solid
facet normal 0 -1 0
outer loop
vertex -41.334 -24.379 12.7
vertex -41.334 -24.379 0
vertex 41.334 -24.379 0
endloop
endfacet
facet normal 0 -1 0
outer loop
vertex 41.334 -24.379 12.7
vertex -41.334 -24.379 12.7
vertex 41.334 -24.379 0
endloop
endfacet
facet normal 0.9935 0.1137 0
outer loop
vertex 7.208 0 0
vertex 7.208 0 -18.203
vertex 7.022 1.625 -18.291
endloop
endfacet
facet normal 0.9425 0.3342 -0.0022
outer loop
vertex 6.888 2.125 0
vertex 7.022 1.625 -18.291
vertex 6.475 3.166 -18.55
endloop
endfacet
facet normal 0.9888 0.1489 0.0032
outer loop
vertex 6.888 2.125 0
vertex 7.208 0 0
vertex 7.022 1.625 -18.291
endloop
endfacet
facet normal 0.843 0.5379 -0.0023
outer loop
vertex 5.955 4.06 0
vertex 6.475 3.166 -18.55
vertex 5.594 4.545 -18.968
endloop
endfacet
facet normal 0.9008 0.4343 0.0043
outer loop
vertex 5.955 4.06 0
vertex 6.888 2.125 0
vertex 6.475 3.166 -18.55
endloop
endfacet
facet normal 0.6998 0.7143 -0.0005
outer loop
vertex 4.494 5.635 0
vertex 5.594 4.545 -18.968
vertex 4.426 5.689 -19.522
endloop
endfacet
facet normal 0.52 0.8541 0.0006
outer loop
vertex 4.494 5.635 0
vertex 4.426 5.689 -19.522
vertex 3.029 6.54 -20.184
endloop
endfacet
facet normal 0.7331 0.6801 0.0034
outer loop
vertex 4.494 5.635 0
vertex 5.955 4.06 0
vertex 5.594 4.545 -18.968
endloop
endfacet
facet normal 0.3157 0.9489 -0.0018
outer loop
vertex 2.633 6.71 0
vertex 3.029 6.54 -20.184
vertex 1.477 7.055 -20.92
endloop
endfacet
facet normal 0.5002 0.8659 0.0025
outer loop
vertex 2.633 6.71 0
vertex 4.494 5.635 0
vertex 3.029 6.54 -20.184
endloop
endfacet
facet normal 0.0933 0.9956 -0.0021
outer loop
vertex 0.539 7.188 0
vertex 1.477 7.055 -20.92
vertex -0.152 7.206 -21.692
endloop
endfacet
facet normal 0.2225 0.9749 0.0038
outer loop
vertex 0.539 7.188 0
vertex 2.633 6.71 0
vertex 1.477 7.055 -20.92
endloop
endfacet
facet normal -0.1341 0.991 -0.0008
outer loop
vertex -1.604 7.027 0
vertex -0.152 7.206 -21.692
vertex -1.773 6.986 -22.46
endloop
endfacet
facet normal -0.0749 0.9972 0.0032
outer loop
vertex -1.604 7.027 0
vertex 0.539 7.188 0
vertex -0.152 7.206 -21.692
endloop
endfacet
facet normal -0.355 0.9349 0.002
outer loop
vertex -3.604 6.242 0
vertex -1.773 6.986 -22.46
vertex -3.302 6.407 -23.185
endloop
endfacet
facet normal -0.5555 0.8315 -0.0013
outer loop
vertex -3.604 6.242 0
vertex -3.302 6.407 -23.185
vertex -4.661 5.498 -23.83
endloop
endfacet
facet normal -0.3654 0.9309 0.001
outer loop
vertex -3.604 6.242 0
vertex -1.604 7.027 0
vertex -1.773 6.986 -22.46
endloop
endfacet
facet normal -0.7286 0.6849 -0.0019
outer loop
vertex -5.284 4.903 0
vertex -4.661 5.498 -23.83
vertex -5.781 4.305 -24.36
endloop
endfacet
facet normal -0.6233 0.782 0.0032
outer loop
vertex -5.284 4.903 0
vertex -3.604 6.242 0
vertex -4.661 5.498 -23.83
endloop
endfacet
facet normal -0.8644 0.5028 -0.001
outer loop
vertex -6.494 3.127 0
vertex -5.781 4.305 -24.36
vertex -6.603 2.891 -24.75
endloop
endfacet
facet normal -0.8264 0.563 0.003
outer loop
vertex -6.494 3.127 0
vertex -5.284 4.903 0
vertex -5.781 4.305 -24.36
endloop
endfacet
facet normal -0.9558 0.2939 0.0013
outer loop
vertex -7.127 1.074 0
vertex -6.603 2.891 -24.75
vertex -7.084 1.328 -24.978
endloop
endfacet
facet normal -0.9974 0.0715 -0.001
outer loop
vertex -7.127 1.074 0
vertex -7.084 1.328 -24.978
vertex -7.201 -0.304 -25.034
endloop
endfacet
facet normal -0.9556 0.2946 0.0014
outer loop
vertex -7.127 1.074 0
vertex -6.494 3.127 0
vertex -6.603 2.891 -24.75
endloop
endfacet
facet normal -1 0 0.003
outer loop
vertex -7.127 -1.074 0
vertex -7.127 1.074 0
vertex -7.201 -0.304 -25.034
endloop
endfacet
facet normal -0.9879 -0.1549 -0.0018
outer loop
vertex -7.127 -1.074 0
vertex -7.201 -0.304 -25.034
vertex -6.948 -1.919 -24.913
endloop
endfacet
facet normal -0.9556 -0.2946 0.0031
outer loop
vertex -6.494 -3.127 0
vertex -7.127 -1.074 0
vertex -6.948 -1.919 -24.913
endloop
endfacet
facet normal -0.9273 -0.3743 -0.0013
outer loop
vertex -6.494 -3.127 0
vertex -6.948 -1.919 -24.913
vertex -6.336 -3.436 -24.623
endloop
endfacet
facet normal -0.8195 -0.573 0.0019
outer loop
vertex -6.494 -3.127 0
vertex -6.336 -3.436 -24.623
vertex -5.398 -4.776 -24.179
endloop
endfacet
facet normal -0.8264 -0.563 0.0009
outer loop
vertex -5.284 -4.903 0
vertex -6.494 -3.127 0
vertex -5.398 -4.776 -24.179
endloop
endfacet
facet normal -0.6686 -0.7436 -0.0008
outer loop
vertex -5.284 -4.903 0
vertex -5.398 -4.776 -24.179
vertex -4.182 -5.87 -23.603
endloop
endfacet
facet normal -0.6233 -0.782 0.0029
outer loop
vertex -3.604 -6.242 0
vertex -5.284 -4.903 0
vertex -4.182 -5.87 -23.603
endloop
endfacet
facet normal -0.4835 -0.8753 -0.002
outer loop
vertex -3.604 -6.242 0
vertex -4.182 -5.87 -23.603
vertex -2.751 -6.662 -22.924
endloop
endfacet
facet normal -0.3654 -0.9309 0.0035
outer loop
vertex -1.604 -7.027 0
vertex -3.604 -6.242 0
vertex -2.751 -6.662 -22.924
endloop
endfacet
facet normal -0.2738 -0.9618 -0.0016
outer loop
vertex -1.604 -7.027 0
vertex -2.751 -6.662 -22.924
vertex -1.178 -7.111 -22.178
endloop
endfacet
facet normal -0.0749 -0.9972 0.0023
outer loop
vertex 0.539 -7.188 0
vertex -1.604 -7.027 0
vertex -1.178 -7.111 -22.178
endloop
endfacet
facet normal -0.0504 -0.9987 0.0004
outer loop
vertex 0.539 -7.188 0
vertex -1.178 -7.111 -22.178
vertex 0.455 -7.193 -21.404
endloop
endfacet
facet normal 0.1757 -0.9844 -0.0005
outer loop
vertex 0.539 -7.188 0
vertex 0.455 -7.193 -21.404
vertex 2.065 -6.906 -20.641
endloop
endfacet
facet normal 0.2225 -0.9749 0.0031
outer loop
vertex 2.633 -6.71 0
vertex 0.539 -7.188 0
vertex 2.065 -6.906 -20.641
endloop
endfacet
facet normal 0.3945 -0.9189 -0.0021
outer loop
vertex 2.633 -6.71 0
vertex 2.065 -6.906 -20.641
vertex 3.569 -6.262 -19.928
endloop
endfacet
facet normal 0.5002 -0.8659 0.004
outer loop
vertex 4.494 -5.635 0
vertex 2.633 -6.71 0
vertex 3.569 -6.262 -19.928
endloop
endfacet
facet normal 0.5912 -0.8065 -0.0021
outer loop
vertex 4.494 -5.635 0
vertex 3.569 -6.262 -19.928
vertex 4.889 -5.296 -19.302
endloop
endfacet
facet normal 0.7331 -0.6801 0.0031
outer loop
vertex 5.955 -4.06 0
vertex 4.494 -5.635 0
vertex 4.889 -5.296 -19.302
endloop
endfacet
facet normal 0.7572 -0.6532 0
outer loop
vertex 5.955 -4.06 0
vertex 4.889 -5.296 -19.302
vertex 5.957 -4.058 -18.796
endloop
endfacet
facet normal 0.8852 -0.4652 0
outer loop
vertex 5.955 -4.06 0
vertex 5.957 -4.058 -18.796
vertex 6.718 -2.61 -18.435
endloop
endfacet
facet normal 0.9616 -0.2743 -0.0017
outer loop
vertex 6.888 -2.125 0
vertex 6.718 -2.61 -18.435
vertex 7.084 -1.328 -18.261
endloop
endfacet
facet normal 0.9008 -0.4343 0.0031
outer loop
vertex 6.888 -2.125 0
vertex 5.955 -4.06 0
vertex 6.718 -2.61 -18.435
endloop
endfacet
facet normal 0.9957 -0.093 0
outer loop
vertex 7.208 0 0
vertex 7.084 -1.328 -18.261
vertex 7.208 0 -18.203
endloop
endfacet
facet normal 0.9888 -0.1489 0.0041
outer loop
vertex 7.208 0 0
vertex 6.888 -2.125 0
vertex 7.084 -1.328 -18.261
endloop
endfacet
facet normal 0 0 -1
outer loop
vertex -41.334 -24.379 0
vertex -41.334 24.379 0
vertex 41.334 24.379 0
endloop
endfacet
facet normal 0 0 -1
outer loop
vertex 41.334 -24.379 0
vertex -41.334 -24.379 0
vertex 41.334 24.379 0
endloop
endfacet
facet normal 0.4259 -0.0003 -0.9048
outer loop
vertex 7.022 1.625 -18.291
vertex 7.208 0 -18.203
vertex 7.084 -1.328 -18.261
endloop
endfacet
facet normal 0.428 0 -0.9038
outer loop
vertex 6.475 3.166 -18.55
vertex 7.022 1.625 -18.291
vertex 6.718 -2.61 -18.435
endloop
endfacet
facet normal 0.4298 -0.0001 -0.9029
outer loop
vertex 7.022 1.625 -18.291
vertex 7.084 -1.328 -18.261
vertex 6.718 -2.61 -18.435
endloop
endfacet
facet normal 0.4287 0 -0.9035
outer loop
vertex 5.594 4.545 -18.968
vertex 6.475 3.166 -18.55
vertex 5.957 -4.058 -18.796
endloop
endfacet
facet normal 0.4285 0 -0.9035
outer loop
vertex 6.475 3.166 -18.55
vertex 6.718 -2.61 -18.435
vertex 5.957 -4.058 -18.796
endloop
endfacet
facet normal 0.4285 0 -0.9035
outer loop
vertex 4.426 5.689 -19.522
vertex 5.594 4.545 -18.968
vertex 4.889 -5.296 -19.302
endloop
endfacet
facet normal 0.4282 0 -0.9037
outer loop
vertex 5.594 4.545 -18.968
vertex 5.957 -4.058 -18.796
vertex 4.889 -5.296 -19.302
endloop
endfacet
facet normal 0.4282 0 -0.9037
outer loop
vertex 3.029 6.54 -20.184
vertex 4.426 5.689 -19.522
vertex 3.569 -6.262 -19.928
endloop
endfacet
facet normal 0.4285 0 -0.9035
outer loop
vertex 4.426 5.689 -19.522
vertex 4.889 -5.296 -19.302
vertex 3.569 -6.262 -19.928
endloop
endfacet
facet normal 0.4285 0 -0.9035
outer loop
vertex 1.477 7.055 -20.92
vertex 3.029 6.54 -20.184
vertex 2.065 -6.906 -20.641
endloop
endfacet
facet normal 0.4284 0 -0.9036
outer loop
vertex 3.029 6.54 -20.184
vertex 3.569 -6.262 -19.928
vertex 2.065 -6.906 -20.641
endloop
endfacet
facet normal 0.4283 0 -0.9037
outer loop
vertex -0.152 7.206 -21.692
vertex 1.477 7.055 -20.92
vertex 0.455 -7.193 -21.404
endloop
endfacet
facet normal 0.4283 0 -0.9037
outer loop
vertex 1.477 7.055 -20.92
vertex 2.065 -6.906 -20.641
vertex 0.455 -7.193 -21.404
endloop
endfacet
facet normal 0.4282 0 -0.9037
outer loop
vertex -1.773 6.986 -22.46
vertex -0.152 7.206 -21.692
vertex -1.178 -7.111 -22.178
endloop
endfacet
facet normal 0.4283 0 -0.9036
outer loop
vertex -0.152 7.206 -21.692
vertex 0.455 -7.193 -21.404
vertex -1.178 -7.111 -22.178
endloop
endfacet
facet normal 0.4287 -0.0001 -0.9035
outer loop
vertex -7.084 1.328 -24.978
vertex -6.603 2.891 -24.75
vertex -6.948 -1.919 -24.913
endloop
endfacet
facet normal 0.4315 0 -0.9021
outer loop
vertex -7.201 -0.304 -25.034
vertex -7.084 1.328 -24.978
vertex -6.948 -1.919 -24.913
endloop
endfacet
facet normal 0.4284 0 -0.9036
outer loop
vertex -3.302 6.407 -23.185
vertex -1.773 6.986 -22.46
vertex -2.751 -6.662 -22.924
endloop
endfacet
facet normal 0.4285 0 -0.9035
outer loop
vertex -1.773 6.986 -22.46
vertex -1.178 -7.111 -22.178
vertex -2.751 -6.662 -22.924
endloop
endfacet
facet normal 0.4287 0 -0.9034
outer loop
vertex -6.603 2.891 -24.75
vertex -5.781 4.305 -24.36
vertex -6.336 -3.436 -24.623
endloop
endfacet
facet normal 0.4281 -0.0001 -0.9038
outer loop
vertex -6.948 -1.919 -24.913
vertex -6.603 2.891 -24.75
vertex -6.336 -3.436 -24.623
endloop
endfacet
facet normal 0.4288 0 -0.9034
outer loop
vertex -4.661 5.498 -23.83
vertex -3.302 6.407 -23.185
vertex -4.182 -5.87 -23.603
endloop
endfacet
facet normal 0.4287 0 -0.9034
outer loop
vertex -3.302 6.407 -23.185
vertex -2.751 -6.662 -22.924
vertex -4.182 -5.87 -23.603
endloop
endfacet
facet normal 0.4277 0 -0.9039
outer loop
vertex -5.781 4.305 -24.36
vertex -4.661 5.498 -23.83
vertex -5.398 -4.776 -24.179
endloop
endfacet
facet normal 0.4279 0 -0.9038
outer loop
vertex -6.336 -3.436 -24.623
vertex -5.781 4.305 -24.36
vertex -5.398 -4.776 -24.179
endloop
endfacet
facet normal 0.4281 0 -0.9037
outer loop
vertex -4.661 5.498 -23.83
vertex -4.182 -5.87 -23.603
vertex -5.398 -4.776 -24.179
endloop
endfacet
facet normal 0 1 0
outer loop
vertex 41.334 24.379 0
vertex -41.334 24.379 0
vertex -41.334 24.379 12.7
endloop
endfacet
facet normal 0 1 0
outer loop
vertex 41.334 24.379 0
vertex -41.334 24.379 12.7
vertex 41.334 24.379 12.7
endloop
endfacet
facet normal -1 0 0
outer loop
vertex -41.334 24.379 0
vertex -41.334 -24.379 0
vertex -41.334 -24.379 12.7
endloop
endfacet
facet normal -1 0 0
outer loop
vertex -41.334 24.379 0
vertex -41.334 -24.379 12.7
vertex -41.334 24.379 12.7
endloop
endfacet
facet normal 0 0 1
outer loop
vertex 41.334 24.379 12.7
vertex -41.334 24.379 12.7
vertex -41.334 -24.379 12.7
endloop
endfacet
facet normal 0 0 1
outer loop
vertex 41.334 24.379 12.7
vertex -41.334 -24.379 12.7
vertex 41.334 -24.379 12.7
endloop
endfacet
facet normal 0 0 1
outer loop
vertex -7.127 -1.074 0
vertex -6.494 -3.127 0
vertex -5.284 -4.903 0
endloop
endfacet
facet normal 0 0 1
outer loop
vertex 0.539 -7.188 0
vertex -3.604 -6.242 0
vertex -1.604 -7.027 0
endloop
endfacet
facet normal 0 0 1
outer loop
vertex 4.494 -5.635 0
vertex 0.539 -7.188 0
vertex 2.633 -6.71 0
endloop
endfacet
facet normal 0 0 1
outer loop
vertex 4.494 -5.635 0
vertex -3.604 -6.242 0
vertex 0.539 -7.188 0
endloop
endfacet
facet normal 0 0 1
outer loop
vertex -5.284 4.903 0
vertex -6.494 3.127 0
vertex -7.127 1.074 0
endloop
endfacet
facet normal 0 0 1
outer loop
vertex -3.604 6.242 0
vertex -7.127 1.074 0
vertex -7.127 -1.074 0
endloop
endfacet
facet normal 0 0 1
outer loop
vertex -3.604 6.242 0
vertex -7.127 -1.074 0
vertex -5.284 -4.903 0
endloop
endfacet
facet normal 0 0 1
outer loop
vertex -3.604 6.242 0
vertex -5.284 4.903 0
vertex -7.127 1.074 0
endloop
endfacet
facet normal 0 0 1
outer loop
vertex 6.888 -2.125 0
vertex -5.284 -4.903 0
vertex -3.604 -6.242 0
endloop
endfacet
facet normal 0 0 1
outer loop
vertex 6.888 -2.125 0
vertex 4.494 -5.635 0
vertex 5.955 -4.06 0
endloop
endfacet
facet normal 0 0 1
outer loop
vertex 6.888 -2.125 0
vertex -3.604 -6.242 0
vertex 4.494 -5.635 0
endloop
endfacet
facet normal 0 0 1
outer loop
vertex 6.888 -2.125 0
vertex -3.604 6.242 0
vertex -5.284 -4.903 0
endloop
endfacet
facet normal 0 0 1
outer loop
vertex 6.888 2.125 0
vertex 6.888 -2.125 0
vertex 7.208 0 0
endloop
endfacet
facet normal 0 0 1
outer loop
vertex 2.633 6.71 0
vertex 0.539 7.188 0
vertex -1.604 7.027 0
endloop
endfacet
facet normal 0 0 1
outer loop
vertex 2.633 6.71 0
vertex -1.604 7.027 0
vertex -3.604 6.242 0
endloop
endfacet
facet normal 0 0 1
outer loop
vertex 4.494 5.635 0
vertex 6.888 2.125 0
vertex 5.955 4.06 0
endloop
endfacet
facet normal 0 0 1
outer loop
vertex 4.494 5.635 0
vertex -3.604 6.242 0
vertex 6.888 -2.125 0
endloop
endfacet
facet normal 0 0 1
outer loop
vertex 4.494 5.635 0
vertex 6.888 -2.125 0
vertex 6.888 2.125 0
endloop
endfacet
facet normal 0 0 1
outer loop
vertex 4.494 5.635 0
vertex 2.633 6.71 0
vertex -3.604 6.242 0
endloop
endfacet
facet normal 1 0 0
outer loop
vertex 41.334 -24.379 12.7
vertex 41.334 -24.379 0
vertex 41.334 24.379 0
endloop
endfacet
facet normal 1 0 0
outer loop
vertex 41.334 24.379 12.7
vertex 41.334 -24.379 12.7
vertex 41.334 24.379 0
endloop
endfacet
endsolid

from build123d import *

# Parameters (mm, degrees)
F0_W     = 82.667836
F0_H     = 48.757524
F0_R     = 7.207753
F1_DEPTH = 12.7
F2_DEPTH = 25.4
F4_DEPTH = 12.7


with BuildPart() as f1:
    # F0 (on Top) → F1 (new body)
    with BuildSketch(Plane.XY):
        Rectangle(F0_W, F0_H)
        Circle(F0_R, mode=Mode.SUBTRACT)
        Circle(F0_R)
    extrude(amount=F1_DEPTH)


with BuildPart() as f2:
    # F0 (on Top) → F2 (new body)
    with BuildSketch(Plane.XY):
        Circle(F0_R)
    extrude(amount=-F2_DEPTH)

    # F3 (on Front) → F4 (cut, symmetric)
    with BuildSketch(Plane.XZ):
        Polygon((12.739278, -15.580411), (-12.006084, -27.311545), (12.739278, -27.311545), align=None)
    extrude(amount=F4_DEPTH, both=True, mode=Mode.SUBTRACT)


solid = Compound([f1.part, f2.part])
